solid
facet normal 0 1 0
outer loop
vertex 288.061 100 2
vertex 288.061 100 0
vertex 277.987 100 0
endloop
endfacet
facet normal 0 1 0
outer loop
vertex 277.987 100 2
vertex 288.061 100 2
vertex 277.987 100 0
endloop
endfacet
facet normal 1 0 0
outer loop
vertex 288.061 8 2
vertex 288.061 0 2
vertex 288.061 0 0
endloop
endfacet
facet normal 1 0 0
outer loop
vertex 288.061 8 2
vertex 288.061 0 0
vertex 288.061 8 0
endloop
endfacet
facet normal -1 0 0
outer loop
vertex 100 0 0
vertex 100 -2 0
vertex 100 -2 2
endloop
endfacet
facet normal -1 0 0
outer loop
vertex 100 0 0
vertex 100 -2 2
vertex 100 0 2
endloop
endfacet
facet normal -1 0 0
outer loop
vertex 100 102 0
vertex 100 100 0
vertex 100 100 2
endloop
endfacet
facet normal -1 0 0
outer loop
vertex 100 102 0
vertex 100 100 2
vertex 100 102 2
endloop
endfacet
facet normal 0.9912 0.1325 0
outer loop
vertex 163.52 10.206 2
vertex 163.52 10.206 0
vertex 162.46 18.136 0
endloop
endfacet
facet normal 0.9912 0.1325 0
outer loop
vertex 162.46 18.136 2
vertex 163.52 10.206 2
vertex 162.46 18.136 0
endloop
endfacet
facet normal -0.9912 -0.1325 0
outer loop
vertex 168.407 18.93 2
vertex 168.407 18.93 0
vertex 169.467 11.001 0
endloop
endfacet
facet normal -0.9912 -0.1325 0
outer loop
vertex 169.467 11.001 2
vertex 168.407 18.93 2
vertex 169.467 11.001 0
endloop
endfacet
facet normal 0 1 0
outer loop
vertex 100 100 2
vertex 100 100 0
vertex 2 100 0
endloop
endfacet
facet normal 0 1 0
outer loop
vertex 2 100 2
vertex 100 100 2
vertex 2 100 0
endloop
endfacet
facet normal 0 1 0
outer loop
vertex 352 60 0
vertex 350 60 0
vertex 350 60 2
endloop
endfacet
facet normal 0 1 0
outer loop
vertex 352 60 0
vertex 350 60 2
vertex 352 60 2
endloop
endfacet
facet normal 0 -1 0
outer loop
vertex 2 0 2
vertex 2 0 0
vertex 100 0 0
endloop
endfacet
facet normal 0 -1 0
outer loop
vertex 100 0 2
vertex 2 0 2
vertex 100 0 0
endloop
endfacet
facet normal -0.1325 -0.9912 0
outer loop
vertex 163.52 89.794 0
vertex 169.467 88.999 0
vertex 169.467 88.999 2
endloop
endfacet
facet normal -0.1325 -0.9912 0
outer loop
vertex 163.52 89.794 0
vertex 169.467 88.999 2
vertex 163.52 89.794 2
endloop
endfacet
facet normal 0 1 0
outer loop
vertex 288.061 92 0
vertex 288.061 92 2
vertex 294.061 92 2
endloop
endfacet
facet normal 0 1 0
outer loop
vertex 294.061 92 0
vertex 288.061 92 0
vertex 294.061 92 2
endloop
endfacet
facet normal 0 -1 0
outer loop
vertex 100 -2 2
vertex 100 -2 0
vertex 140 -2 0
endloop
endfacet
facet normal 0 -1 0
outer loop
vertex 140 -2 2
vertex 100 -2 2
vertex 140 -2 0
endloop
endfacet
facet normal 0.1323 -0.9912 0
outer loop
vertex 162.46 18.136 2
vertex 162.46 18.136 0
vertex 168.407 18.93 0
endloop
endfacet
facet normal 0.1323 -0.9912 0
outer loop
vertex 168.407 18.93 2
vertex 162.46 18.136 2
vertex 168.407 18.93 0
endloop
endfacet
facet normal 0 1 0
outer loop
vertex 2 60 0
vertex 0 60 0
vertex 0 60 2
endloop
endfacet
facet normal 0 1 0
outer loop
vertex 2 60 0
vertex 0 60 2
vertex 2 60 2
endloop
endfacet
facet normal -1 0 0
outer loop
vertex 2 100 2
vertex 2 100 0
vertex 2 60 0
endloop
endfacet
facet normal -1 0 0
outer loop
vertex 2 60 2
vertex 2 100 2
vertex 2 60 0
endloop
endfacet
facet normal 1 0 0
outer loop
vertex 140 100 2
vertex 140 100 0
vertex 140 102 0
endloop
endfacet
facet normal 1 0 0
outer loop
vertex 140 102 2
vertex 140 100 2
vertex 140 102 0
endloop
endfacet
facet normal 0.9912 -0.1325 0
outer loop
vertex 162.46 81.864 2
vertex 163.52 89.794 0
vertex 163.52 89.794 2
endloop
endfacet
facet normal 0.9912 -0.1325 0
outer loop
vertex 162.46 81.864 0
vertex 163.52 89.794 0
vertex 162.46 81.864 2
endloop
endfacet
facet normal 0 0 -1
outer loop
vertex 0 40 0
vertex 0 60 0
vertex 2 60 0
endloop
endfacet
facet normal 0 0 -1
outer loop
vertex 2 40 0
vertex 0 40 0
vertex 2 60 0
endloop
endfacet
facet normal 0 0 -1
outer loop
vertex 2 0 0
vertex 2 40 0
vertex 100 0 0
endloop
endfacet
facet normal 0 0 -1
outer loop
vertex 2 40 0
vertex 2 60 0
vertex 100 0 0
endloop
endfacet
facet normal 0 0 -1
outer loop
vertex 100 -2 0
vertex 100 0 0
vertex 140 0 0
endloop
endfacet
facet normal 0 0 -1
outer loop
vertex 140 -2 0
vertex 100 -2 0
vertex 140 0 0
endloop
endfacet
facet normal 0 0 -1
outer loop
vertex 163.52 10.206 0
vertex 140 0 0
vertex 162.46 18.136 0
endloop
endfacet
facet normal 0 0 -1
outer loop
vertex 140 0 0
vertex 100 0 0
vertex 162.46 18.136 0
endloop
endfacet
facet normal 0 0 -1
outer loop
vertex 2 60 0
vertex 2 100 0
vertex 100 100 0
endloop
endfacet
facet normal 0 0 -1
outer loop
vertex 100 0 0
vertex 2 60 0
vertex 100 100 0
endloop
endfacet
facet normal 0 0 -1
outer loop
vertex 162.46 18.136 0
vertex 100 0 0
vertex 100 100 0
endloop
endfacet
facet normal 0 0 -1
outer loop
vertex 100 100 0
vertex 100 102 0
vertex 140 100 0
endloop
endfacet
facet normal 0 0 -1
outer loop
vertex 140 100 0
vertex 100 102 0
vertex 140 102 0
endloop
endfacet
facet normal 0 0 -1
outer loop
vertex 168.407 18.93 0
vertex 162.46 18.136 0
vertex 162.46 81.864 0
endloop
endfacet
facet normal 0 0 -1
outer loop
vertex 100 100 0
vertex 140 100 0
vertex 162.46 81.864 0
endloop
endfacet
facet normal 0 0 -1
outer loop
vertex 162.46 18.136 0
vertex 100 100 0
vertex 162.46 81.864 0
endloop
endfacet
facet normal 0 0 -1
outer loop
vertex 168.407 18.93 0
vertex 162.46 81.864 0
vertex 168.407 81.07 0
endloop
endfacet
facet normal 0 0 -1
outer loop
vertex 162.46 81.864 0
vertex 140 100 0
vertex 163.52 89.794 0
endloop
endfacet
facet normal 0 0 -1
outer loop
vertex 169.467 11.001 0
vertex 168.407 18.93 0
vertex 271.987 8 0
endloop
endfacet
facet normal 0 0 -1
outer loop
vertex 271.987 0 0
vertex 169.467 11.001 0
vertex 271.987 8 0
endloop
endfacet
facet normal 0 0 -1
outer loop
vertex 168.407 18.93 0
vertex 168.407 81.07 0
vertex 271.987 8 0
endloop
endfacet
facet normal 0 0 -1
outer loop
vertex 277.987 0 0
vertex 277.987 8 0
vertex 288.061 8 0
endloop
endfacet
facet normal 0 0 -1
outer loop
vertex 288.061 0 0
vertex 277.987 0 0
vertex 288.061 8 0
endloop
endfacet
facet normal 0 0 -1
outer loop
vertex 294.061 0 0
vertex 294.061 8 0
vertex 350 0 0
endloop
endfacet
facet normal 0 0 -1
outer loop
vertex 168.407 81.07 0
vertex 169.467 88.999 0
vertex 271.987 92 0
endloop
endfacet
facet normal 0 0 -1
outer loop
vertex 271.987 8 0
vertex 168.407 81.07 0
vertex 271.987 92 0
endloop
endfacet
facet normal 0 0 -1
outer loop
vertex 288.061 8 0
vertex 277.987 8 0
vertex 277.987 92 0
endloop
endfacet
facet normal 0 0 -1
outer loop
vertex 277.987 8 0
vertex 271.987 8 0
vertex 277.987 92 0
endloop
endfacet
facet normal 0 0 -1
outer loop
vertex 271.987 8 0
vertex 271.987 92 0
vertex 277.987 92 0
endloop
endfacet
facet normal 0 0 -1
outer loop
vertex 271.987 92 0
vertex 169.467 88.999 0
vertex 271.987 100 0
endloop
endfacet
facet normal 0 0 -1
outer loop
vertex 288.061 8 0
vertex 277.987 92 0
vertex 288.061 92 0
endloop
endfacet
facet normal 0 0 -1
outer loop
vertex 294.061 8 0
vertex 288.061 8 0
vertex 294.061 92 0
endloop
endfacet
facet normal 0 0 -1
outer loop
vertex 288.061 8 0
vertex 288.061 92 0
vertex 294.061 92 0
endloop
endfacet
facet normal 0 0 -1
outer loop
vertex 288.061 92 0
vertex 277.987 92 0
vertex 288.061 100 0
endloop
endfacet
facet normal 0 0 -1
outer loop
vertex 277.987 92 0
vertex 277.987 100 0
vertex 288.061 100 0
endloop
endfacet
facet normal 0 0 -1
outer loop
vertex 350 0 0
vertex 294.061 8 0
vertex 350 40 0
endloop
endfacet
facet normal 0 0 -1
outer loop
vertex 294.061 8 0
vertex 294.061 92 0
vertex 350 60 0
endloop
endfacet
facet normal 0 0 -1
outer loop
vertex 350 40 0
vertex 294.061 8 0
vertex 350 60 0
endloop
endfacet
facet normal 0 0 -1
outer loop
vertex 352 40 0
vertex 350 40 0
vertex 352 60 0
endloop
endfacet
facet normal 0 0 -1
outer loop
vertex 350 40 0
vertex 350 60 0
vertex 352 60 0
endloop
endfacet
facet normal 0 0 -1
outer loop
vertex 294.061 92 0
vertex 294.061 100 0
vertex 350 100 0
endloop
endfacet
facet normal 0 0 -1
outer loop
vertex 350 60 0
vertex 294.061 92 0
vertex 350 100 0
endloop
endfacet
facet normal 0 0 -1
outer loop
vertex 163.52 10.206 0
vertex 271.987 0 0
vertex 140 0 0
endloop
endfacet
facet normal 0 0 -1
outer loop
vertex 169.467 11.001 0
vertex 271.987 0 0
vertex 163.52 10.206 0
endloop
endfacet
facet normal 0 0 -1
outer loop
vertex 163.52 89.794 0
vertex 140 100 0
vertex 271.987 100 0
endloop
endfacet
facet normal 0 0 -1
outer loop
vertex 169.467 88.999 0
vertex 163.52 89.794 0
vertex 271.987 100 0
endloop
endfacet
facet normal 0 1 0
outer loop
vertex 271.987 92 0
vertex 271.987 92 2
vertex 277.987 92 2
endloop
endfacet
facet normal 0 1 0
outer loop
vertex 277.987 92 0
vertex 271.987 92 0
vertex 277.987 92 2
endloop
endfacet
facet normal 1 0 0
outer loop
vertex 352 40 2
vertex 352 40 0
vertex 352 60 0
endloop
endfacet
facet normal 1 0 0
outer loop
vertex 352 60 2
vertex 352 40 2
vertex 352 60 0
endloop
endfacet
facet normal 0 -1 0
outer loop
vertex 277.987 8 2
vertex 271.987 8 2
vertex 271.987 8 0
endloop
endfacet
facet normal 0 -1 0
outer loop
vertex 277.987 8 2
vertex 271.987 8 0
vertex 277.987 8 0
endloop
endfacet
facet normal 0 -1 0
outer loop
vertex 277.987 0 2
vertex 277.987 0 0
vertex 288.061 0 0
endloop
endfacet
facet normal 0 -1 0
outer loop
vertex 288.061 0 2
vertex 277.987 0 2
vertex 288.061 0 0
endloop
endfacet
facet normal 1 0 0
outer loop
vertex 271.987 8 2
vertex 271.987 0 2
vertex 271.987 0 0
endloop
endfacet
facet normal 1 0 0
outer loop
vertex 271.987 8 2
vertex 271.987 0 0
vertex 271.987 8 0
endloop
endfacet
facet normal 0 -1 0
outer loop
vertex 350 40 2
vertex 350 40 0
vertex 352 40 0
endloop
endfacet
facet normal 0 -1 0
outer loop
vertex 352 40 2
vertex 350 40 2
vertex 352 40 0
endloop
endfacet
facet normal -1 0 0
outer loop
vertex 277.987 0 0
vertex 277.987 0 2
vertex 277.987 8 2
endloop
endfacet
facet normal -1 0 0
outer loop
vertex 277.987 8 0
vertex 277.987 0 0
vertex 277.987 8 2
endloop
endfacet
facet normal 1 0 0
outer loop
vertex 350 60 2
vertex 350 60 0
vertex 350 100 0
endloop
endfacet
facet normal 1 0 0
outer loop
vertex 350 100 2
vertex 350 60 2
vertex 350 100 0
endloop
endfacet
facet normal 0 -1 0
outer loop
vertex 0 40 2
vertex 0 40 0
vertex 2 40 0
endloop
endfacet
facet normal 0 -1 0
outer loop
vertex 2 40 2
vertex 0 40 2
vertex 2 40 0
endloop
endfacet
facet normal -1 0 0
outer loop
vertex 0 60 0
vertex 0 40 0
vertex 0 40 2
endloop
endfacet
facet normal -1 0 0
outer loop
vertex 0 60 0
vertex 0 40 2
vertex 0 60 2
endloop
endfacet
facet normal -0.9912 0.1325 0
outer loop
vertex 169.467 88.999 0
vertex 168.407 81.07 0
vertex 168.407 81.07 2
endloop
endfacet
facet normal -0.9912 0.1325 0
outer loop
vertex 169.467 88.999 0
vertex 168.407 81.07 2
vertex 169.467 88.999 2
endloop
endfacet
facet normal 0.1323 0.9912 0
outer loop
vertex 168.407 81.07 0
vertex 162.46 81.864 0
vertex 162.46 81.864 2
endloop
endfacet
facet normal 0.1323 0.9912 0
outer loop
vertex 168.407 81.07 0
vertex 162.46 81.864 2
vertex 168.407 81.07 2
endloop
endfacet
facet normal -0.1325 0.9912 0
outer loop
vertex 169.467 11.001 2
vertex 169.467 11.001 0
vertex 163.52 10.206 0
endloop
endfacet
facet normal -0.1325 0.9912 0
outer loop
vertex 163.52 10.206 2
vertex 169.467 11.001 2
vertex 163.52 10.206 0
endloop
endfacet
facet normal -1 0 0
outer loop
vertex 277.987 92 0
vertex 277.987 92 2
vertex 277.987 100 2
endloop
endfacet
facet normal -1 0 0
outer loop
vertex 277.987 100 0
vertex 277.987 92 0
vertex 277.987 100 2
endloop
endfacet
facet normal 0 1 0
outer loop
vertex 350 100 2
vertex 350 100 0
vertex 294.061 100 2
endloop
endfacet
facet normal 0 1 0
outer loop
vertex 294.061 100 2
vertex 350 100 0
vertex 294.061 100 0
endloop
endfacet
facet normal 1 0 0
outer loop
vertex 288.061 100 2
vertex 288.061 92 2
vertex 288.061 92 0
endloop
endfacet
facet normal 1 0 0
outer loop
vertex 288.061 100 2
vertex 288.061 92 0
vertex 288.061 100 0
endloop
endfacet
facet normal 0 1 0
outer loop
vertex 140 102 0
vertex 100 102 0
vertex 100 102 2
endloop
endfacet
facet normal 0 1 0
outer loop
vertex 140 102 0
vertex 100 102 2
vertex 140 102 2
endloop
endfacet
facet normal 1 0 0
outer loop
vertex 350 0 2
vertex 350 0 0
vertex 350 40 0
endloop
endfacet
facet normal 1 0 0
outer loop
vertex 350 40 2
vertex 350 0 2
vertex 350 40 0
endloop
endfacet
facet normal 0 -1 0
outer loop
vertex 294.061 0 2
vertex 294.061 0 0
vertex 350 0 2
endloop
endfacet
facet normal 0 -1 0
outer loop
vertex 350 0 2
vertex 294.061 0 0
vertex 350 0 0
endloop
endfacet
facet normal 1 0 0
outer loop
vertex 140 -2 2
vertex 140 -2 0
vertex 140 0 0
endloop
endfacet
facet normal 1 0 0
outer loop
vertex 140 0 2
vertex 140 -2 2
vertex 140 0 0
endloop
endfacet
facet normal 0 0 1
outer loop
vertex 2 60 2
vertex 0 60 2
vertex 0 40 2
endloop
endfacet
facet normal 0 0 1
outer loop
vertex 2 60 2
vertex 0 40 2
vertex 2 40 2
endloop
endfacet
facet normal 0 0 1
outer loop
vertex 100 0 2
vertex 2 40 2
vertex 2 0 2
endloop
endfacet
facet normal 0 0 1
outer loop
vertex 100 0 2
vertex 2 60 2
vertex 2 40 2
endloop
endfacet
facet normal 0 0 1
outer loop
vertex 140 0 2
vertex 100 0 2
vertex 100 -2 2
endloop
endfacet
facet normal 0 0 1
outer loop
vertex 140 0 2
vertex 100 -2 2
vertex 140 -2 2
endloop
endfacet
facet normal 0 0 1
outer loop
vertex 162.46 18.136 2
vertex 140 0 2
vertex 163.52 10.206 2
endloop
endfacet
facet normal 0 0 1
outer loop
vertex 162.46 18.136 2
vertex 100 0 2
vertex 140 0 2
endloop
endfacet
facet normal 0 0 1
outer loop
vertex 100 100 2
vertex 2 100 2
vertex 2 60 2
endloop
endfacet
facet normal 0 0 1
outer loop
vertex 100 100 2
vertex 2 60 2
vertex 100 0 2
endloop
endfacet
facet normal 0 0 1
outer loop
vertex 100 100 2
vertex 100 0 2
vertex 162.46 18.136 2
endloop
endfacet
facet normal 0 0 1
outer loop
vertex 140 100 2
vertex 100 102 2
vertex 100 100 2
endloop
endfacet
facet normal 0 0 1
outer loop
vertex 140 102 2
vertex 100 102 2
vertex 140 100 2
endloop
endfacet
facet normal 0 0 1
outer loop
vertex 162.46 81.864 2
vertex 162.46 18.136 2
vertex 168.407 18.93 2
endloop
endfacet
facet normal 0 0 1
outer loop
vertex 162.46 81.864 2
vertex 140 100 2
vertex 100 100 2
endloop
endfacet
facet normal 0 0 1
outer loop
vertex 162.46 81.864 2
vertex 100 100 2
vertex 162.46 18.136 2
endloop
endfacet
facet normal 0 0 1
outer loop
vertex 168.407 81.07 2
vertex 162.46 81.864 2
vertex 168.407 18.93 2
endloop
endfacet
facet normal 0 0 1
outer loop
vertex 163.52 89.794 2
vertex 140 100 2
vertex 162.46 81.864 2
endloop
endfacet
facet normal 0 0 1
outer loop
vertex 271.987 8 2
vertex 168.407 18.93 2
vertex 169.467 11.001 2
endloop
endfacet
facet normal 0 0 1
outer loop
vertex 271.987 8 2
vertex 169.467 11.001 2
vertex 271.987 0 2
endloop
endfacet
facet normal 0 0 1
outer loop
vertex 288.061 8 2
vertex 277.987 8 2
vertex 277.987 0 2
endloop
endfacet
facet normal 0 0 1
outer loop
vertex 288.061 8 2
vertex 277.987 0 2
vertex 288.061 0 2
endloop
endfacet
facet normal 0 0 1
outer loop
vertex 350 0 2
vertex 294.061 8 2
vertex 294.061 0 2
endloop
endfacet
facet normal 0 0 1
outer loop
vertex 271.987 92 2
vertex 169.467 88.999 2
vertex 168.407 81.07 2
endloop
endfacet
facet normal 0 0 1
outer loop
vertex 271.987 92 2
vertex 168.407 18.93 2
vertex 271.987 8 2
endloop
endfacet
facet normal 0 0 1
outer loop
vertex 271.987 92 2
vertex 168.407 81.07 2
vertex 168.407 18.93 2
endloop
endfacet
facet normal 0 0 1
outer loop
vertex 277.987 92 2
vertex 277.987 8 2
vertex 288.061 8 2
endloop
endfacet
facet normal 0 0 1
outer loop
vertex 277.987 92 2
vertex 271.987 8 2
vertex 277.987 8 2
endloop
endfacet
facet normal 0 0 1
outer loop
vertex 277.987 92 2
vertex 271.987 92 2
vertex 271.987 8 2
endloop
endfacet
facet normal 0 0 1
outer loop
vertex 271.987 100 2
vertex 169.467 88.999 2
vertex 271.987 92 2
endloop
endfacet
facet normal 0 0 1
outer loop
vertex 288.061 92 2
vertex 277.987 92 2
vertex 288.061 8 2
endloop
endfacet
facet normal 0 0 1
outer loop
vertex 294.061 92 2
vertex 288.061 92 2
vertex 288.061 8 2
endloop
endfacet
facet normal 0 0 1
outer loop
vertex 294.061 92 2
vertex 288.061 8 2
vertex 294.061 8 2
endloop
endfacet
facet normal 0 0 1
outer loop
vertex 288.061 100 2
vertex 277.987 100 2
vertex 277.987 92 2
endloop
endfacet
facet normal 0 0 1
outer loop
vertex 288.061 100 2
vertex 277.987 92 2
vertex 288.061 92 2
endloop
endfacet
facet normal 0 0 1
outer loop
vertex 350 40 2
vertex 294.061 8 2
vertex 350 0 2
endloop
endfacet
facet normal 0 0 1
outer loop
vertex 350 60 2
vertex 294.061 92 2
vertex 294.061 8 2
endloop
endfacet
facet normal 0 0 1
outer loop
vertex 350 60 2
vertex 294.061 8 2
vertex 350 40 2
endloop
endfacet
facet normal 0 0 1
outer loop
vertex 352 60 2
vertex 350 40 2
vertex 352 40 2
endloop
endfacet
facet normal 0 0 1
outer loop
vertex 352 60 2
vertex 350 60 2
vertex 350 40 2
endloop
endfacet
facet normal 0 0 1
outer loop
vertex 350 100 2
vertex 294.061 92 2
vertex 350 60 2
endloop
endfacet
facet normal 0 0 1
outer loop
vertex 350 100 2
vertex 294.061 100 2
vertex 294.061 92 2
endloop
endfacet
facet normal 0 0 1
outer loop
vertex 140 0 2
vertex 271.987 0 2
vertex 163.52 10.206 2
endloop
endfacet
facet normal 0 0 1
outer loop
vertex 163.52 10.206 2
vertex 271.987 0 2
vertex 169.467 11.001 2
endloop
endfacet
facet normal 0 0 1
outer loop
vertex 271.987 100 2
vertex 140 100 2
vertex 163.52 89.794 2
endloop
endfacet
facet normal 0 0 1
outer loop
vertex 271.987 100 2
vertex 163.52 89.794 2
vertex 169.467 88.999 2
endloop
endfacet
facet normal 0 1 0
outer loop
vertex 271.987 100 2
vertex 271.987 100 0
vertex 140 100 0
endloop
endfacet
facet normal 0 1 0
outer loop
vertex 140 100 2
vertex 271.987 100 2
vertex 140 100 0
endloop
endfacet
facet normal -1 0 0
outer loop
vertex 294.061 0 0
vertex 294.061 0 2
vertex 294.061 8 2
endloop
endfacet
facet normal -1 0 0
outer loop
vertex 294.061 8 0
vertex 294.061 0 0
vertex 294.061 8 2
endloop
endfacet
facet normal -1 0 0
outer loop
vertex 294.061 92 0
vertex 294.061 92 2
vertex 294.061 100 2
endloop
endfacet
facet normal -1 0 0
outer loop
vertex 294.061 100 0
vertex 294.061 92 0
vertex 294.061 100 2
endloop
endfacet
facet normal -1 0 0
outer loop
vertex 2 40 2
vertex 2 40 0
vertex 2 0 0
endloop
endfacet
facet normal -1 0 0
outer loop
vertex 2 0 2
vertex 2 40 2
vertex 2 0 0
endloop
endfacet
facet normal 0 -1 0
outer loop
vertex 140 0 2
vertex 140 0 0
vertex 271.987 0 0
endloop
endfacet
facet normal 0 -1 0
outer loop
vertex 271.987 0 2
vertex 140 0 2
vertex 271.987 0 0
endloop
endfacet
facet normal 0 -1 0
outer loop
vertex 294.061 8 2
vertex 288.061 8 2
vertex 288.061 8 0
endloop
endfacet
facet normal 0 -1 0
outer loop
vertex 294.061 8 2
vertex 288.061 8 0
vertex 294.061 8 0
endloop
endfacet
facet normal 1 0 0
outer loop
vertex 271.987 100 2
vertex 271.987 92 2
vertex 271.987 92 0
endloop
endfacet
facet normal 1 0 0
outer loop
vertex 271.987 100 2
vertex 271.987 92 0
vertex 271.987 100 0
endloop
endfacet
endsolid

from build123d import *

# Parameters (mm, degrees)
SKETCH_1_W          = 2
SKETCH_1_H          = 20
SKETCH_1_W_2        = 40
SKETCH_1_H_2        = 2
EXTRUDE_1_DEPTH     = 2
CUT_EXTRUDE_1_DEPTH = 10
SKETCH_3_W          = 6
SKETCH_3_H          = 8
CUT_EXTRUDE_2_DEPTH = 2
SKETCH_4_W          = 6
SKETCH_4_H          = 8
CUT_EXTRUDE_3_DEPTH = 2


with BuildPart() as part:
    # 草图1 → 凸台-拉伸1 (new body)
    with BuildSketch(Plane.XY):
        with Locations((1, 50)):
            Rectangle(SKETCH_1_W, SKETCH_1_H)
        Polygon((2, 40), (2, 0), (100, 0), (140, 0), (350, 0), (350, 40), (350, 60), (350, 100), (140, 100), (100, 100), (2, 100), (2, 60), align=None)
        with Locations((120, 101)):
            Rectangle(SKETCH_1_W_2, SKETCH_1_H_2)
        with Locations((120, -1)):
            Rectangle(SKETCH_1_W_2, SKETCH_1_H_2)
        with Locations((351, 50)):
            Rectangle(SKETCH_1_W, SKETCH_1_H)
    extrude(amount=EXTRUDE_1_DEPTH)

    # 草图2 → 切除-拉伸1 (cut)
    with BuildSketch(Plane(origin=(0, 0, 0), x_dir=(-1, 0, 0), z_dir=(0, 0, -1))):
        Polygon((-168.407456688, 81.069541445), (-169.466891791, 88.999080981), (-163.519737138, 89.793657309), (-162.460302035, 81.864117772), align=None)
        Polygon((-162.460302035, 18.135882228), (-168.407456688, 18.930458555), (-169.466891791, 11.000919019), (-163.519737138, 10.206342691), align=None)
    extrude(amount=-CUT_EXTRUDE_1_DEPTH, mode=Mode.SUBTRACT)

    # 草图3 → 切除-拉伸2 (cut)
    with BuildSketch(Plane.XY.offset(2)):
        with Locations((291.061030213, 96)):
            Rectangle(SKETCH_3_W, SKETCH_3_H)
        with Locations((291.061030213, 4)):
            Rectangle(SKETCH_3_W, SKETCH_3_H)
    extrude(amount=-CUT_EXTRUDE_2_DEPTH, mode=Mode.SUBTRACT)

    # 草图4 → 切除-拉伸3 (cut)
    with BuildSketch(Plane.XY.offset(2)):
        with Locations((274.986515691, 4)):
            Rectangle(SKETCH_4_W, SKETCH_4_H)
        with Locations((274.986515691, 96)):
            Rectangle(SKETCH_4_W, SKETCH_4_H)
    extrude(amount=-CUT_EXTRUDE_3_DEPTH, mode=Mode.SUBTRACT)


solid = part.part
